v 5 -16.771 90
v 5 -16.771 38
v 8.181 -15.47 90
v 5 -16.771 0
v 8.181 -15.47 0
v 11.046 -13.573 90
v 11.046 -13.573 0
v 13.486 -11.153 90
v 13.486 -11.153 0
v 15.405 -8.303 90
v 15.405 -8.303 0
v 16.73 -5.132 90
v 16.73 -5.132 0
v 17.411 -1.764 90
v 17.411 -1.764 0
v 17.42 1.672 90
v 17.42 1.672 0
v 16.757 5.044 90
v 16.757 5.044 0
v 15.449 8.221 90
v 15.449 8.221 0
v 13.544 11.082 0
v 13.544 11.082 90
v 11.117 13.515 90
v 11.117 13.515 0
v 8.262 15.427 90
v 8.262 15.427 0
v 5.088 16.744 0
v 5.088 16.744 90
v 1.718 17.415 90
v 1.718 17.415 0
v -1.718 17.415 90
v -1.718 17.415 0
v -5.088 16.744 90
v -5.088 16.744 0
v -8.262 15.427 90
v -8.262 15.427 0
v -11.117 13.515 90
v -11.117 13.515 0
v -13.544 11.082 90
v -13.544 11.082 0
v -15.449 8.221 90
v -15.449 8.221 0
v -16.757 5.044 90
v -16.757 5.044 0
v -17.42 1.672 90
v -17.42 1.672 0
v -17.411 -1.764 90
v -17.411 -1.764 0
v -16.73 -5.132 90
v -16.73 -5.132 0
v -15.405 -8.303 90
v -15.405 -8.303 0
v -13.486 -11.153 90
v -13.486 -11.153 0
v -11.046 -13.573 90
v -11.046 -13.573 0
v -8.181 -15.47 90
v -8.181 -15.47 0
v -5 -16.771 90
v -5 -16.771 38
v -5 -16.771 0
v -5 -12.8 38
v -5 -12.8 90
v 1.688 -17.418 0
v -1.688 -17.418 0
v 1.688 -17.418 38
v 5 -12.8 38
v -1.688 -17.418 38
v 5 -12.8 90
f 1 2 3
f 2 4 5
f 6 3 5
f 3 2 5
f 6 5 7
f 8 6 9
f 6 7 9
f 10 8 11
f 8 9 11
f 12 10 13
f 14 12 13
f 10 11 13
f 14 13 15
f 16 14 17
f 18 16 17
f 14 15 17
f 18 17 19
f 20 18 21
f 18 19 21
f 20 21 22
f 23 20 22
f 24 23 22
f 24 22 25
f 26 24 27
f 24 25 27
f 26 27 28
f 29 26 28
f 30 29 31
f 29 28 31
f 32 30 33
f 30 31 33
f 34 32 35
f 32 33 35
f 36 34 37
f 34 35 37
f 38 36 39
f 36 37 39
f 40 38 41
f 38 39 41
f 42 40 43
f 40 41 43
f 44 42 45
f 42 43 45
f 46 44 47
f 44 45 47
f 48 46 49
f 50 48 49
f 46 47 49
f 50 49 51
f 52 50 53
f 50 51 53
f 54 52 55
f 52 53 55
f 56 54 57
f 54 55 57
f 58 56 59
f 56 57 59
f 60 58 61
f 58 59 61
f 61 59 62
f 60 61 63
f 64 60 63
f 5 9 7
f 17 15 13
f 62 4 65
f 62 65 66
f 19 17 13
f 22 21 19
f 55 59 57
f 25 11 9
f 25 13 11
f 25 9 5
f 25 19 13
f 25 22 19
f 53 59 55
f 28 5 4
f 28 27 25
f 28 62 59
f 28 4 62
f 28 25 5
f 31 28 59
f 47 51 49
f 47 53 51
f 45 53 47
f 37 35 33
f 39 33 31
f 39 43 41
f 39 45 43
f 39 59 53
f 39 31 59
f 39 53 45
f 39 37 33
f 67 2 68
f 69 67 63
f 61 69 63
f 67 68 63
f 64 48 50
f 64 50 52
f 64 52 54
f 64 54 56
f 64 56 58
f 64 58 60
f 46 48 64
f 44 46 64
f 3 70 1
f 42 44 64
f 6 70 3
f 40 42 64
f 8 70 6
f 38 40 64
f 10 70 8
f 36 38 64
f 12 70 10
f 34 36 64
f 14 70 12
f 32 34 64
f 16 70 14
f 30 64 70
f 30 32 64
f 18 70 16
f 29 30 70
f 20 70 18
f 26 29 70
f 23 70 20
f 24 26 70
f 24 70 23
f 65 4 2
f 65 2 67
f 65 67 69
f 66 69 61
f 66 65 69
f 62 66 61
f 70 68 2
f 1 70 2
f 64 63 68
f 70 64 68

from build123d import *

# Parameters (mm, degrees)
BOSS_EXTRUDE1_DEPTH = 90
BOSS_EXTRUDE2_DEPTH = 38


with BuildPart() as part:
    # Sketch1 → Boss-Extrude1 (new body)
    with BuildSketch(Plane.XY):
        with BuildLine():
            Line((-5, -16.770509831), (-5, -12.8))
            Line((-5, -12.8), (5, -12.8))
            Line((5, -12.8), (5, -16.770509831))
            ThreePointArc((5, -16.770509831), (0, 17.5), (-5, -16.770509831))
        make_face()
    extrude(amount=BOSS_EXTRUDE1_DEPTH)

    # Sketch2 → Boss-Extrude2 (add)
    with BuildSketch(Plane(origin=(0, 0, 0), x_dir=(-1, 0, 0), z_dir=(0, 0, -1))):
        with BuildLine():
            ThreePointArc((-5, -16.770509831), (0, -17.5), (5, -16.770509831))
            Line((5, -16.770509831), (5, -12.8))
            Line((5, -12.8), (-5, -12.8))
            Line((-5, -12.8), (-5, -16.770509831))
        make_face()
    extrude(amount=-BOSS_EXTRUDE2_DEPTH)


solid = part.part
